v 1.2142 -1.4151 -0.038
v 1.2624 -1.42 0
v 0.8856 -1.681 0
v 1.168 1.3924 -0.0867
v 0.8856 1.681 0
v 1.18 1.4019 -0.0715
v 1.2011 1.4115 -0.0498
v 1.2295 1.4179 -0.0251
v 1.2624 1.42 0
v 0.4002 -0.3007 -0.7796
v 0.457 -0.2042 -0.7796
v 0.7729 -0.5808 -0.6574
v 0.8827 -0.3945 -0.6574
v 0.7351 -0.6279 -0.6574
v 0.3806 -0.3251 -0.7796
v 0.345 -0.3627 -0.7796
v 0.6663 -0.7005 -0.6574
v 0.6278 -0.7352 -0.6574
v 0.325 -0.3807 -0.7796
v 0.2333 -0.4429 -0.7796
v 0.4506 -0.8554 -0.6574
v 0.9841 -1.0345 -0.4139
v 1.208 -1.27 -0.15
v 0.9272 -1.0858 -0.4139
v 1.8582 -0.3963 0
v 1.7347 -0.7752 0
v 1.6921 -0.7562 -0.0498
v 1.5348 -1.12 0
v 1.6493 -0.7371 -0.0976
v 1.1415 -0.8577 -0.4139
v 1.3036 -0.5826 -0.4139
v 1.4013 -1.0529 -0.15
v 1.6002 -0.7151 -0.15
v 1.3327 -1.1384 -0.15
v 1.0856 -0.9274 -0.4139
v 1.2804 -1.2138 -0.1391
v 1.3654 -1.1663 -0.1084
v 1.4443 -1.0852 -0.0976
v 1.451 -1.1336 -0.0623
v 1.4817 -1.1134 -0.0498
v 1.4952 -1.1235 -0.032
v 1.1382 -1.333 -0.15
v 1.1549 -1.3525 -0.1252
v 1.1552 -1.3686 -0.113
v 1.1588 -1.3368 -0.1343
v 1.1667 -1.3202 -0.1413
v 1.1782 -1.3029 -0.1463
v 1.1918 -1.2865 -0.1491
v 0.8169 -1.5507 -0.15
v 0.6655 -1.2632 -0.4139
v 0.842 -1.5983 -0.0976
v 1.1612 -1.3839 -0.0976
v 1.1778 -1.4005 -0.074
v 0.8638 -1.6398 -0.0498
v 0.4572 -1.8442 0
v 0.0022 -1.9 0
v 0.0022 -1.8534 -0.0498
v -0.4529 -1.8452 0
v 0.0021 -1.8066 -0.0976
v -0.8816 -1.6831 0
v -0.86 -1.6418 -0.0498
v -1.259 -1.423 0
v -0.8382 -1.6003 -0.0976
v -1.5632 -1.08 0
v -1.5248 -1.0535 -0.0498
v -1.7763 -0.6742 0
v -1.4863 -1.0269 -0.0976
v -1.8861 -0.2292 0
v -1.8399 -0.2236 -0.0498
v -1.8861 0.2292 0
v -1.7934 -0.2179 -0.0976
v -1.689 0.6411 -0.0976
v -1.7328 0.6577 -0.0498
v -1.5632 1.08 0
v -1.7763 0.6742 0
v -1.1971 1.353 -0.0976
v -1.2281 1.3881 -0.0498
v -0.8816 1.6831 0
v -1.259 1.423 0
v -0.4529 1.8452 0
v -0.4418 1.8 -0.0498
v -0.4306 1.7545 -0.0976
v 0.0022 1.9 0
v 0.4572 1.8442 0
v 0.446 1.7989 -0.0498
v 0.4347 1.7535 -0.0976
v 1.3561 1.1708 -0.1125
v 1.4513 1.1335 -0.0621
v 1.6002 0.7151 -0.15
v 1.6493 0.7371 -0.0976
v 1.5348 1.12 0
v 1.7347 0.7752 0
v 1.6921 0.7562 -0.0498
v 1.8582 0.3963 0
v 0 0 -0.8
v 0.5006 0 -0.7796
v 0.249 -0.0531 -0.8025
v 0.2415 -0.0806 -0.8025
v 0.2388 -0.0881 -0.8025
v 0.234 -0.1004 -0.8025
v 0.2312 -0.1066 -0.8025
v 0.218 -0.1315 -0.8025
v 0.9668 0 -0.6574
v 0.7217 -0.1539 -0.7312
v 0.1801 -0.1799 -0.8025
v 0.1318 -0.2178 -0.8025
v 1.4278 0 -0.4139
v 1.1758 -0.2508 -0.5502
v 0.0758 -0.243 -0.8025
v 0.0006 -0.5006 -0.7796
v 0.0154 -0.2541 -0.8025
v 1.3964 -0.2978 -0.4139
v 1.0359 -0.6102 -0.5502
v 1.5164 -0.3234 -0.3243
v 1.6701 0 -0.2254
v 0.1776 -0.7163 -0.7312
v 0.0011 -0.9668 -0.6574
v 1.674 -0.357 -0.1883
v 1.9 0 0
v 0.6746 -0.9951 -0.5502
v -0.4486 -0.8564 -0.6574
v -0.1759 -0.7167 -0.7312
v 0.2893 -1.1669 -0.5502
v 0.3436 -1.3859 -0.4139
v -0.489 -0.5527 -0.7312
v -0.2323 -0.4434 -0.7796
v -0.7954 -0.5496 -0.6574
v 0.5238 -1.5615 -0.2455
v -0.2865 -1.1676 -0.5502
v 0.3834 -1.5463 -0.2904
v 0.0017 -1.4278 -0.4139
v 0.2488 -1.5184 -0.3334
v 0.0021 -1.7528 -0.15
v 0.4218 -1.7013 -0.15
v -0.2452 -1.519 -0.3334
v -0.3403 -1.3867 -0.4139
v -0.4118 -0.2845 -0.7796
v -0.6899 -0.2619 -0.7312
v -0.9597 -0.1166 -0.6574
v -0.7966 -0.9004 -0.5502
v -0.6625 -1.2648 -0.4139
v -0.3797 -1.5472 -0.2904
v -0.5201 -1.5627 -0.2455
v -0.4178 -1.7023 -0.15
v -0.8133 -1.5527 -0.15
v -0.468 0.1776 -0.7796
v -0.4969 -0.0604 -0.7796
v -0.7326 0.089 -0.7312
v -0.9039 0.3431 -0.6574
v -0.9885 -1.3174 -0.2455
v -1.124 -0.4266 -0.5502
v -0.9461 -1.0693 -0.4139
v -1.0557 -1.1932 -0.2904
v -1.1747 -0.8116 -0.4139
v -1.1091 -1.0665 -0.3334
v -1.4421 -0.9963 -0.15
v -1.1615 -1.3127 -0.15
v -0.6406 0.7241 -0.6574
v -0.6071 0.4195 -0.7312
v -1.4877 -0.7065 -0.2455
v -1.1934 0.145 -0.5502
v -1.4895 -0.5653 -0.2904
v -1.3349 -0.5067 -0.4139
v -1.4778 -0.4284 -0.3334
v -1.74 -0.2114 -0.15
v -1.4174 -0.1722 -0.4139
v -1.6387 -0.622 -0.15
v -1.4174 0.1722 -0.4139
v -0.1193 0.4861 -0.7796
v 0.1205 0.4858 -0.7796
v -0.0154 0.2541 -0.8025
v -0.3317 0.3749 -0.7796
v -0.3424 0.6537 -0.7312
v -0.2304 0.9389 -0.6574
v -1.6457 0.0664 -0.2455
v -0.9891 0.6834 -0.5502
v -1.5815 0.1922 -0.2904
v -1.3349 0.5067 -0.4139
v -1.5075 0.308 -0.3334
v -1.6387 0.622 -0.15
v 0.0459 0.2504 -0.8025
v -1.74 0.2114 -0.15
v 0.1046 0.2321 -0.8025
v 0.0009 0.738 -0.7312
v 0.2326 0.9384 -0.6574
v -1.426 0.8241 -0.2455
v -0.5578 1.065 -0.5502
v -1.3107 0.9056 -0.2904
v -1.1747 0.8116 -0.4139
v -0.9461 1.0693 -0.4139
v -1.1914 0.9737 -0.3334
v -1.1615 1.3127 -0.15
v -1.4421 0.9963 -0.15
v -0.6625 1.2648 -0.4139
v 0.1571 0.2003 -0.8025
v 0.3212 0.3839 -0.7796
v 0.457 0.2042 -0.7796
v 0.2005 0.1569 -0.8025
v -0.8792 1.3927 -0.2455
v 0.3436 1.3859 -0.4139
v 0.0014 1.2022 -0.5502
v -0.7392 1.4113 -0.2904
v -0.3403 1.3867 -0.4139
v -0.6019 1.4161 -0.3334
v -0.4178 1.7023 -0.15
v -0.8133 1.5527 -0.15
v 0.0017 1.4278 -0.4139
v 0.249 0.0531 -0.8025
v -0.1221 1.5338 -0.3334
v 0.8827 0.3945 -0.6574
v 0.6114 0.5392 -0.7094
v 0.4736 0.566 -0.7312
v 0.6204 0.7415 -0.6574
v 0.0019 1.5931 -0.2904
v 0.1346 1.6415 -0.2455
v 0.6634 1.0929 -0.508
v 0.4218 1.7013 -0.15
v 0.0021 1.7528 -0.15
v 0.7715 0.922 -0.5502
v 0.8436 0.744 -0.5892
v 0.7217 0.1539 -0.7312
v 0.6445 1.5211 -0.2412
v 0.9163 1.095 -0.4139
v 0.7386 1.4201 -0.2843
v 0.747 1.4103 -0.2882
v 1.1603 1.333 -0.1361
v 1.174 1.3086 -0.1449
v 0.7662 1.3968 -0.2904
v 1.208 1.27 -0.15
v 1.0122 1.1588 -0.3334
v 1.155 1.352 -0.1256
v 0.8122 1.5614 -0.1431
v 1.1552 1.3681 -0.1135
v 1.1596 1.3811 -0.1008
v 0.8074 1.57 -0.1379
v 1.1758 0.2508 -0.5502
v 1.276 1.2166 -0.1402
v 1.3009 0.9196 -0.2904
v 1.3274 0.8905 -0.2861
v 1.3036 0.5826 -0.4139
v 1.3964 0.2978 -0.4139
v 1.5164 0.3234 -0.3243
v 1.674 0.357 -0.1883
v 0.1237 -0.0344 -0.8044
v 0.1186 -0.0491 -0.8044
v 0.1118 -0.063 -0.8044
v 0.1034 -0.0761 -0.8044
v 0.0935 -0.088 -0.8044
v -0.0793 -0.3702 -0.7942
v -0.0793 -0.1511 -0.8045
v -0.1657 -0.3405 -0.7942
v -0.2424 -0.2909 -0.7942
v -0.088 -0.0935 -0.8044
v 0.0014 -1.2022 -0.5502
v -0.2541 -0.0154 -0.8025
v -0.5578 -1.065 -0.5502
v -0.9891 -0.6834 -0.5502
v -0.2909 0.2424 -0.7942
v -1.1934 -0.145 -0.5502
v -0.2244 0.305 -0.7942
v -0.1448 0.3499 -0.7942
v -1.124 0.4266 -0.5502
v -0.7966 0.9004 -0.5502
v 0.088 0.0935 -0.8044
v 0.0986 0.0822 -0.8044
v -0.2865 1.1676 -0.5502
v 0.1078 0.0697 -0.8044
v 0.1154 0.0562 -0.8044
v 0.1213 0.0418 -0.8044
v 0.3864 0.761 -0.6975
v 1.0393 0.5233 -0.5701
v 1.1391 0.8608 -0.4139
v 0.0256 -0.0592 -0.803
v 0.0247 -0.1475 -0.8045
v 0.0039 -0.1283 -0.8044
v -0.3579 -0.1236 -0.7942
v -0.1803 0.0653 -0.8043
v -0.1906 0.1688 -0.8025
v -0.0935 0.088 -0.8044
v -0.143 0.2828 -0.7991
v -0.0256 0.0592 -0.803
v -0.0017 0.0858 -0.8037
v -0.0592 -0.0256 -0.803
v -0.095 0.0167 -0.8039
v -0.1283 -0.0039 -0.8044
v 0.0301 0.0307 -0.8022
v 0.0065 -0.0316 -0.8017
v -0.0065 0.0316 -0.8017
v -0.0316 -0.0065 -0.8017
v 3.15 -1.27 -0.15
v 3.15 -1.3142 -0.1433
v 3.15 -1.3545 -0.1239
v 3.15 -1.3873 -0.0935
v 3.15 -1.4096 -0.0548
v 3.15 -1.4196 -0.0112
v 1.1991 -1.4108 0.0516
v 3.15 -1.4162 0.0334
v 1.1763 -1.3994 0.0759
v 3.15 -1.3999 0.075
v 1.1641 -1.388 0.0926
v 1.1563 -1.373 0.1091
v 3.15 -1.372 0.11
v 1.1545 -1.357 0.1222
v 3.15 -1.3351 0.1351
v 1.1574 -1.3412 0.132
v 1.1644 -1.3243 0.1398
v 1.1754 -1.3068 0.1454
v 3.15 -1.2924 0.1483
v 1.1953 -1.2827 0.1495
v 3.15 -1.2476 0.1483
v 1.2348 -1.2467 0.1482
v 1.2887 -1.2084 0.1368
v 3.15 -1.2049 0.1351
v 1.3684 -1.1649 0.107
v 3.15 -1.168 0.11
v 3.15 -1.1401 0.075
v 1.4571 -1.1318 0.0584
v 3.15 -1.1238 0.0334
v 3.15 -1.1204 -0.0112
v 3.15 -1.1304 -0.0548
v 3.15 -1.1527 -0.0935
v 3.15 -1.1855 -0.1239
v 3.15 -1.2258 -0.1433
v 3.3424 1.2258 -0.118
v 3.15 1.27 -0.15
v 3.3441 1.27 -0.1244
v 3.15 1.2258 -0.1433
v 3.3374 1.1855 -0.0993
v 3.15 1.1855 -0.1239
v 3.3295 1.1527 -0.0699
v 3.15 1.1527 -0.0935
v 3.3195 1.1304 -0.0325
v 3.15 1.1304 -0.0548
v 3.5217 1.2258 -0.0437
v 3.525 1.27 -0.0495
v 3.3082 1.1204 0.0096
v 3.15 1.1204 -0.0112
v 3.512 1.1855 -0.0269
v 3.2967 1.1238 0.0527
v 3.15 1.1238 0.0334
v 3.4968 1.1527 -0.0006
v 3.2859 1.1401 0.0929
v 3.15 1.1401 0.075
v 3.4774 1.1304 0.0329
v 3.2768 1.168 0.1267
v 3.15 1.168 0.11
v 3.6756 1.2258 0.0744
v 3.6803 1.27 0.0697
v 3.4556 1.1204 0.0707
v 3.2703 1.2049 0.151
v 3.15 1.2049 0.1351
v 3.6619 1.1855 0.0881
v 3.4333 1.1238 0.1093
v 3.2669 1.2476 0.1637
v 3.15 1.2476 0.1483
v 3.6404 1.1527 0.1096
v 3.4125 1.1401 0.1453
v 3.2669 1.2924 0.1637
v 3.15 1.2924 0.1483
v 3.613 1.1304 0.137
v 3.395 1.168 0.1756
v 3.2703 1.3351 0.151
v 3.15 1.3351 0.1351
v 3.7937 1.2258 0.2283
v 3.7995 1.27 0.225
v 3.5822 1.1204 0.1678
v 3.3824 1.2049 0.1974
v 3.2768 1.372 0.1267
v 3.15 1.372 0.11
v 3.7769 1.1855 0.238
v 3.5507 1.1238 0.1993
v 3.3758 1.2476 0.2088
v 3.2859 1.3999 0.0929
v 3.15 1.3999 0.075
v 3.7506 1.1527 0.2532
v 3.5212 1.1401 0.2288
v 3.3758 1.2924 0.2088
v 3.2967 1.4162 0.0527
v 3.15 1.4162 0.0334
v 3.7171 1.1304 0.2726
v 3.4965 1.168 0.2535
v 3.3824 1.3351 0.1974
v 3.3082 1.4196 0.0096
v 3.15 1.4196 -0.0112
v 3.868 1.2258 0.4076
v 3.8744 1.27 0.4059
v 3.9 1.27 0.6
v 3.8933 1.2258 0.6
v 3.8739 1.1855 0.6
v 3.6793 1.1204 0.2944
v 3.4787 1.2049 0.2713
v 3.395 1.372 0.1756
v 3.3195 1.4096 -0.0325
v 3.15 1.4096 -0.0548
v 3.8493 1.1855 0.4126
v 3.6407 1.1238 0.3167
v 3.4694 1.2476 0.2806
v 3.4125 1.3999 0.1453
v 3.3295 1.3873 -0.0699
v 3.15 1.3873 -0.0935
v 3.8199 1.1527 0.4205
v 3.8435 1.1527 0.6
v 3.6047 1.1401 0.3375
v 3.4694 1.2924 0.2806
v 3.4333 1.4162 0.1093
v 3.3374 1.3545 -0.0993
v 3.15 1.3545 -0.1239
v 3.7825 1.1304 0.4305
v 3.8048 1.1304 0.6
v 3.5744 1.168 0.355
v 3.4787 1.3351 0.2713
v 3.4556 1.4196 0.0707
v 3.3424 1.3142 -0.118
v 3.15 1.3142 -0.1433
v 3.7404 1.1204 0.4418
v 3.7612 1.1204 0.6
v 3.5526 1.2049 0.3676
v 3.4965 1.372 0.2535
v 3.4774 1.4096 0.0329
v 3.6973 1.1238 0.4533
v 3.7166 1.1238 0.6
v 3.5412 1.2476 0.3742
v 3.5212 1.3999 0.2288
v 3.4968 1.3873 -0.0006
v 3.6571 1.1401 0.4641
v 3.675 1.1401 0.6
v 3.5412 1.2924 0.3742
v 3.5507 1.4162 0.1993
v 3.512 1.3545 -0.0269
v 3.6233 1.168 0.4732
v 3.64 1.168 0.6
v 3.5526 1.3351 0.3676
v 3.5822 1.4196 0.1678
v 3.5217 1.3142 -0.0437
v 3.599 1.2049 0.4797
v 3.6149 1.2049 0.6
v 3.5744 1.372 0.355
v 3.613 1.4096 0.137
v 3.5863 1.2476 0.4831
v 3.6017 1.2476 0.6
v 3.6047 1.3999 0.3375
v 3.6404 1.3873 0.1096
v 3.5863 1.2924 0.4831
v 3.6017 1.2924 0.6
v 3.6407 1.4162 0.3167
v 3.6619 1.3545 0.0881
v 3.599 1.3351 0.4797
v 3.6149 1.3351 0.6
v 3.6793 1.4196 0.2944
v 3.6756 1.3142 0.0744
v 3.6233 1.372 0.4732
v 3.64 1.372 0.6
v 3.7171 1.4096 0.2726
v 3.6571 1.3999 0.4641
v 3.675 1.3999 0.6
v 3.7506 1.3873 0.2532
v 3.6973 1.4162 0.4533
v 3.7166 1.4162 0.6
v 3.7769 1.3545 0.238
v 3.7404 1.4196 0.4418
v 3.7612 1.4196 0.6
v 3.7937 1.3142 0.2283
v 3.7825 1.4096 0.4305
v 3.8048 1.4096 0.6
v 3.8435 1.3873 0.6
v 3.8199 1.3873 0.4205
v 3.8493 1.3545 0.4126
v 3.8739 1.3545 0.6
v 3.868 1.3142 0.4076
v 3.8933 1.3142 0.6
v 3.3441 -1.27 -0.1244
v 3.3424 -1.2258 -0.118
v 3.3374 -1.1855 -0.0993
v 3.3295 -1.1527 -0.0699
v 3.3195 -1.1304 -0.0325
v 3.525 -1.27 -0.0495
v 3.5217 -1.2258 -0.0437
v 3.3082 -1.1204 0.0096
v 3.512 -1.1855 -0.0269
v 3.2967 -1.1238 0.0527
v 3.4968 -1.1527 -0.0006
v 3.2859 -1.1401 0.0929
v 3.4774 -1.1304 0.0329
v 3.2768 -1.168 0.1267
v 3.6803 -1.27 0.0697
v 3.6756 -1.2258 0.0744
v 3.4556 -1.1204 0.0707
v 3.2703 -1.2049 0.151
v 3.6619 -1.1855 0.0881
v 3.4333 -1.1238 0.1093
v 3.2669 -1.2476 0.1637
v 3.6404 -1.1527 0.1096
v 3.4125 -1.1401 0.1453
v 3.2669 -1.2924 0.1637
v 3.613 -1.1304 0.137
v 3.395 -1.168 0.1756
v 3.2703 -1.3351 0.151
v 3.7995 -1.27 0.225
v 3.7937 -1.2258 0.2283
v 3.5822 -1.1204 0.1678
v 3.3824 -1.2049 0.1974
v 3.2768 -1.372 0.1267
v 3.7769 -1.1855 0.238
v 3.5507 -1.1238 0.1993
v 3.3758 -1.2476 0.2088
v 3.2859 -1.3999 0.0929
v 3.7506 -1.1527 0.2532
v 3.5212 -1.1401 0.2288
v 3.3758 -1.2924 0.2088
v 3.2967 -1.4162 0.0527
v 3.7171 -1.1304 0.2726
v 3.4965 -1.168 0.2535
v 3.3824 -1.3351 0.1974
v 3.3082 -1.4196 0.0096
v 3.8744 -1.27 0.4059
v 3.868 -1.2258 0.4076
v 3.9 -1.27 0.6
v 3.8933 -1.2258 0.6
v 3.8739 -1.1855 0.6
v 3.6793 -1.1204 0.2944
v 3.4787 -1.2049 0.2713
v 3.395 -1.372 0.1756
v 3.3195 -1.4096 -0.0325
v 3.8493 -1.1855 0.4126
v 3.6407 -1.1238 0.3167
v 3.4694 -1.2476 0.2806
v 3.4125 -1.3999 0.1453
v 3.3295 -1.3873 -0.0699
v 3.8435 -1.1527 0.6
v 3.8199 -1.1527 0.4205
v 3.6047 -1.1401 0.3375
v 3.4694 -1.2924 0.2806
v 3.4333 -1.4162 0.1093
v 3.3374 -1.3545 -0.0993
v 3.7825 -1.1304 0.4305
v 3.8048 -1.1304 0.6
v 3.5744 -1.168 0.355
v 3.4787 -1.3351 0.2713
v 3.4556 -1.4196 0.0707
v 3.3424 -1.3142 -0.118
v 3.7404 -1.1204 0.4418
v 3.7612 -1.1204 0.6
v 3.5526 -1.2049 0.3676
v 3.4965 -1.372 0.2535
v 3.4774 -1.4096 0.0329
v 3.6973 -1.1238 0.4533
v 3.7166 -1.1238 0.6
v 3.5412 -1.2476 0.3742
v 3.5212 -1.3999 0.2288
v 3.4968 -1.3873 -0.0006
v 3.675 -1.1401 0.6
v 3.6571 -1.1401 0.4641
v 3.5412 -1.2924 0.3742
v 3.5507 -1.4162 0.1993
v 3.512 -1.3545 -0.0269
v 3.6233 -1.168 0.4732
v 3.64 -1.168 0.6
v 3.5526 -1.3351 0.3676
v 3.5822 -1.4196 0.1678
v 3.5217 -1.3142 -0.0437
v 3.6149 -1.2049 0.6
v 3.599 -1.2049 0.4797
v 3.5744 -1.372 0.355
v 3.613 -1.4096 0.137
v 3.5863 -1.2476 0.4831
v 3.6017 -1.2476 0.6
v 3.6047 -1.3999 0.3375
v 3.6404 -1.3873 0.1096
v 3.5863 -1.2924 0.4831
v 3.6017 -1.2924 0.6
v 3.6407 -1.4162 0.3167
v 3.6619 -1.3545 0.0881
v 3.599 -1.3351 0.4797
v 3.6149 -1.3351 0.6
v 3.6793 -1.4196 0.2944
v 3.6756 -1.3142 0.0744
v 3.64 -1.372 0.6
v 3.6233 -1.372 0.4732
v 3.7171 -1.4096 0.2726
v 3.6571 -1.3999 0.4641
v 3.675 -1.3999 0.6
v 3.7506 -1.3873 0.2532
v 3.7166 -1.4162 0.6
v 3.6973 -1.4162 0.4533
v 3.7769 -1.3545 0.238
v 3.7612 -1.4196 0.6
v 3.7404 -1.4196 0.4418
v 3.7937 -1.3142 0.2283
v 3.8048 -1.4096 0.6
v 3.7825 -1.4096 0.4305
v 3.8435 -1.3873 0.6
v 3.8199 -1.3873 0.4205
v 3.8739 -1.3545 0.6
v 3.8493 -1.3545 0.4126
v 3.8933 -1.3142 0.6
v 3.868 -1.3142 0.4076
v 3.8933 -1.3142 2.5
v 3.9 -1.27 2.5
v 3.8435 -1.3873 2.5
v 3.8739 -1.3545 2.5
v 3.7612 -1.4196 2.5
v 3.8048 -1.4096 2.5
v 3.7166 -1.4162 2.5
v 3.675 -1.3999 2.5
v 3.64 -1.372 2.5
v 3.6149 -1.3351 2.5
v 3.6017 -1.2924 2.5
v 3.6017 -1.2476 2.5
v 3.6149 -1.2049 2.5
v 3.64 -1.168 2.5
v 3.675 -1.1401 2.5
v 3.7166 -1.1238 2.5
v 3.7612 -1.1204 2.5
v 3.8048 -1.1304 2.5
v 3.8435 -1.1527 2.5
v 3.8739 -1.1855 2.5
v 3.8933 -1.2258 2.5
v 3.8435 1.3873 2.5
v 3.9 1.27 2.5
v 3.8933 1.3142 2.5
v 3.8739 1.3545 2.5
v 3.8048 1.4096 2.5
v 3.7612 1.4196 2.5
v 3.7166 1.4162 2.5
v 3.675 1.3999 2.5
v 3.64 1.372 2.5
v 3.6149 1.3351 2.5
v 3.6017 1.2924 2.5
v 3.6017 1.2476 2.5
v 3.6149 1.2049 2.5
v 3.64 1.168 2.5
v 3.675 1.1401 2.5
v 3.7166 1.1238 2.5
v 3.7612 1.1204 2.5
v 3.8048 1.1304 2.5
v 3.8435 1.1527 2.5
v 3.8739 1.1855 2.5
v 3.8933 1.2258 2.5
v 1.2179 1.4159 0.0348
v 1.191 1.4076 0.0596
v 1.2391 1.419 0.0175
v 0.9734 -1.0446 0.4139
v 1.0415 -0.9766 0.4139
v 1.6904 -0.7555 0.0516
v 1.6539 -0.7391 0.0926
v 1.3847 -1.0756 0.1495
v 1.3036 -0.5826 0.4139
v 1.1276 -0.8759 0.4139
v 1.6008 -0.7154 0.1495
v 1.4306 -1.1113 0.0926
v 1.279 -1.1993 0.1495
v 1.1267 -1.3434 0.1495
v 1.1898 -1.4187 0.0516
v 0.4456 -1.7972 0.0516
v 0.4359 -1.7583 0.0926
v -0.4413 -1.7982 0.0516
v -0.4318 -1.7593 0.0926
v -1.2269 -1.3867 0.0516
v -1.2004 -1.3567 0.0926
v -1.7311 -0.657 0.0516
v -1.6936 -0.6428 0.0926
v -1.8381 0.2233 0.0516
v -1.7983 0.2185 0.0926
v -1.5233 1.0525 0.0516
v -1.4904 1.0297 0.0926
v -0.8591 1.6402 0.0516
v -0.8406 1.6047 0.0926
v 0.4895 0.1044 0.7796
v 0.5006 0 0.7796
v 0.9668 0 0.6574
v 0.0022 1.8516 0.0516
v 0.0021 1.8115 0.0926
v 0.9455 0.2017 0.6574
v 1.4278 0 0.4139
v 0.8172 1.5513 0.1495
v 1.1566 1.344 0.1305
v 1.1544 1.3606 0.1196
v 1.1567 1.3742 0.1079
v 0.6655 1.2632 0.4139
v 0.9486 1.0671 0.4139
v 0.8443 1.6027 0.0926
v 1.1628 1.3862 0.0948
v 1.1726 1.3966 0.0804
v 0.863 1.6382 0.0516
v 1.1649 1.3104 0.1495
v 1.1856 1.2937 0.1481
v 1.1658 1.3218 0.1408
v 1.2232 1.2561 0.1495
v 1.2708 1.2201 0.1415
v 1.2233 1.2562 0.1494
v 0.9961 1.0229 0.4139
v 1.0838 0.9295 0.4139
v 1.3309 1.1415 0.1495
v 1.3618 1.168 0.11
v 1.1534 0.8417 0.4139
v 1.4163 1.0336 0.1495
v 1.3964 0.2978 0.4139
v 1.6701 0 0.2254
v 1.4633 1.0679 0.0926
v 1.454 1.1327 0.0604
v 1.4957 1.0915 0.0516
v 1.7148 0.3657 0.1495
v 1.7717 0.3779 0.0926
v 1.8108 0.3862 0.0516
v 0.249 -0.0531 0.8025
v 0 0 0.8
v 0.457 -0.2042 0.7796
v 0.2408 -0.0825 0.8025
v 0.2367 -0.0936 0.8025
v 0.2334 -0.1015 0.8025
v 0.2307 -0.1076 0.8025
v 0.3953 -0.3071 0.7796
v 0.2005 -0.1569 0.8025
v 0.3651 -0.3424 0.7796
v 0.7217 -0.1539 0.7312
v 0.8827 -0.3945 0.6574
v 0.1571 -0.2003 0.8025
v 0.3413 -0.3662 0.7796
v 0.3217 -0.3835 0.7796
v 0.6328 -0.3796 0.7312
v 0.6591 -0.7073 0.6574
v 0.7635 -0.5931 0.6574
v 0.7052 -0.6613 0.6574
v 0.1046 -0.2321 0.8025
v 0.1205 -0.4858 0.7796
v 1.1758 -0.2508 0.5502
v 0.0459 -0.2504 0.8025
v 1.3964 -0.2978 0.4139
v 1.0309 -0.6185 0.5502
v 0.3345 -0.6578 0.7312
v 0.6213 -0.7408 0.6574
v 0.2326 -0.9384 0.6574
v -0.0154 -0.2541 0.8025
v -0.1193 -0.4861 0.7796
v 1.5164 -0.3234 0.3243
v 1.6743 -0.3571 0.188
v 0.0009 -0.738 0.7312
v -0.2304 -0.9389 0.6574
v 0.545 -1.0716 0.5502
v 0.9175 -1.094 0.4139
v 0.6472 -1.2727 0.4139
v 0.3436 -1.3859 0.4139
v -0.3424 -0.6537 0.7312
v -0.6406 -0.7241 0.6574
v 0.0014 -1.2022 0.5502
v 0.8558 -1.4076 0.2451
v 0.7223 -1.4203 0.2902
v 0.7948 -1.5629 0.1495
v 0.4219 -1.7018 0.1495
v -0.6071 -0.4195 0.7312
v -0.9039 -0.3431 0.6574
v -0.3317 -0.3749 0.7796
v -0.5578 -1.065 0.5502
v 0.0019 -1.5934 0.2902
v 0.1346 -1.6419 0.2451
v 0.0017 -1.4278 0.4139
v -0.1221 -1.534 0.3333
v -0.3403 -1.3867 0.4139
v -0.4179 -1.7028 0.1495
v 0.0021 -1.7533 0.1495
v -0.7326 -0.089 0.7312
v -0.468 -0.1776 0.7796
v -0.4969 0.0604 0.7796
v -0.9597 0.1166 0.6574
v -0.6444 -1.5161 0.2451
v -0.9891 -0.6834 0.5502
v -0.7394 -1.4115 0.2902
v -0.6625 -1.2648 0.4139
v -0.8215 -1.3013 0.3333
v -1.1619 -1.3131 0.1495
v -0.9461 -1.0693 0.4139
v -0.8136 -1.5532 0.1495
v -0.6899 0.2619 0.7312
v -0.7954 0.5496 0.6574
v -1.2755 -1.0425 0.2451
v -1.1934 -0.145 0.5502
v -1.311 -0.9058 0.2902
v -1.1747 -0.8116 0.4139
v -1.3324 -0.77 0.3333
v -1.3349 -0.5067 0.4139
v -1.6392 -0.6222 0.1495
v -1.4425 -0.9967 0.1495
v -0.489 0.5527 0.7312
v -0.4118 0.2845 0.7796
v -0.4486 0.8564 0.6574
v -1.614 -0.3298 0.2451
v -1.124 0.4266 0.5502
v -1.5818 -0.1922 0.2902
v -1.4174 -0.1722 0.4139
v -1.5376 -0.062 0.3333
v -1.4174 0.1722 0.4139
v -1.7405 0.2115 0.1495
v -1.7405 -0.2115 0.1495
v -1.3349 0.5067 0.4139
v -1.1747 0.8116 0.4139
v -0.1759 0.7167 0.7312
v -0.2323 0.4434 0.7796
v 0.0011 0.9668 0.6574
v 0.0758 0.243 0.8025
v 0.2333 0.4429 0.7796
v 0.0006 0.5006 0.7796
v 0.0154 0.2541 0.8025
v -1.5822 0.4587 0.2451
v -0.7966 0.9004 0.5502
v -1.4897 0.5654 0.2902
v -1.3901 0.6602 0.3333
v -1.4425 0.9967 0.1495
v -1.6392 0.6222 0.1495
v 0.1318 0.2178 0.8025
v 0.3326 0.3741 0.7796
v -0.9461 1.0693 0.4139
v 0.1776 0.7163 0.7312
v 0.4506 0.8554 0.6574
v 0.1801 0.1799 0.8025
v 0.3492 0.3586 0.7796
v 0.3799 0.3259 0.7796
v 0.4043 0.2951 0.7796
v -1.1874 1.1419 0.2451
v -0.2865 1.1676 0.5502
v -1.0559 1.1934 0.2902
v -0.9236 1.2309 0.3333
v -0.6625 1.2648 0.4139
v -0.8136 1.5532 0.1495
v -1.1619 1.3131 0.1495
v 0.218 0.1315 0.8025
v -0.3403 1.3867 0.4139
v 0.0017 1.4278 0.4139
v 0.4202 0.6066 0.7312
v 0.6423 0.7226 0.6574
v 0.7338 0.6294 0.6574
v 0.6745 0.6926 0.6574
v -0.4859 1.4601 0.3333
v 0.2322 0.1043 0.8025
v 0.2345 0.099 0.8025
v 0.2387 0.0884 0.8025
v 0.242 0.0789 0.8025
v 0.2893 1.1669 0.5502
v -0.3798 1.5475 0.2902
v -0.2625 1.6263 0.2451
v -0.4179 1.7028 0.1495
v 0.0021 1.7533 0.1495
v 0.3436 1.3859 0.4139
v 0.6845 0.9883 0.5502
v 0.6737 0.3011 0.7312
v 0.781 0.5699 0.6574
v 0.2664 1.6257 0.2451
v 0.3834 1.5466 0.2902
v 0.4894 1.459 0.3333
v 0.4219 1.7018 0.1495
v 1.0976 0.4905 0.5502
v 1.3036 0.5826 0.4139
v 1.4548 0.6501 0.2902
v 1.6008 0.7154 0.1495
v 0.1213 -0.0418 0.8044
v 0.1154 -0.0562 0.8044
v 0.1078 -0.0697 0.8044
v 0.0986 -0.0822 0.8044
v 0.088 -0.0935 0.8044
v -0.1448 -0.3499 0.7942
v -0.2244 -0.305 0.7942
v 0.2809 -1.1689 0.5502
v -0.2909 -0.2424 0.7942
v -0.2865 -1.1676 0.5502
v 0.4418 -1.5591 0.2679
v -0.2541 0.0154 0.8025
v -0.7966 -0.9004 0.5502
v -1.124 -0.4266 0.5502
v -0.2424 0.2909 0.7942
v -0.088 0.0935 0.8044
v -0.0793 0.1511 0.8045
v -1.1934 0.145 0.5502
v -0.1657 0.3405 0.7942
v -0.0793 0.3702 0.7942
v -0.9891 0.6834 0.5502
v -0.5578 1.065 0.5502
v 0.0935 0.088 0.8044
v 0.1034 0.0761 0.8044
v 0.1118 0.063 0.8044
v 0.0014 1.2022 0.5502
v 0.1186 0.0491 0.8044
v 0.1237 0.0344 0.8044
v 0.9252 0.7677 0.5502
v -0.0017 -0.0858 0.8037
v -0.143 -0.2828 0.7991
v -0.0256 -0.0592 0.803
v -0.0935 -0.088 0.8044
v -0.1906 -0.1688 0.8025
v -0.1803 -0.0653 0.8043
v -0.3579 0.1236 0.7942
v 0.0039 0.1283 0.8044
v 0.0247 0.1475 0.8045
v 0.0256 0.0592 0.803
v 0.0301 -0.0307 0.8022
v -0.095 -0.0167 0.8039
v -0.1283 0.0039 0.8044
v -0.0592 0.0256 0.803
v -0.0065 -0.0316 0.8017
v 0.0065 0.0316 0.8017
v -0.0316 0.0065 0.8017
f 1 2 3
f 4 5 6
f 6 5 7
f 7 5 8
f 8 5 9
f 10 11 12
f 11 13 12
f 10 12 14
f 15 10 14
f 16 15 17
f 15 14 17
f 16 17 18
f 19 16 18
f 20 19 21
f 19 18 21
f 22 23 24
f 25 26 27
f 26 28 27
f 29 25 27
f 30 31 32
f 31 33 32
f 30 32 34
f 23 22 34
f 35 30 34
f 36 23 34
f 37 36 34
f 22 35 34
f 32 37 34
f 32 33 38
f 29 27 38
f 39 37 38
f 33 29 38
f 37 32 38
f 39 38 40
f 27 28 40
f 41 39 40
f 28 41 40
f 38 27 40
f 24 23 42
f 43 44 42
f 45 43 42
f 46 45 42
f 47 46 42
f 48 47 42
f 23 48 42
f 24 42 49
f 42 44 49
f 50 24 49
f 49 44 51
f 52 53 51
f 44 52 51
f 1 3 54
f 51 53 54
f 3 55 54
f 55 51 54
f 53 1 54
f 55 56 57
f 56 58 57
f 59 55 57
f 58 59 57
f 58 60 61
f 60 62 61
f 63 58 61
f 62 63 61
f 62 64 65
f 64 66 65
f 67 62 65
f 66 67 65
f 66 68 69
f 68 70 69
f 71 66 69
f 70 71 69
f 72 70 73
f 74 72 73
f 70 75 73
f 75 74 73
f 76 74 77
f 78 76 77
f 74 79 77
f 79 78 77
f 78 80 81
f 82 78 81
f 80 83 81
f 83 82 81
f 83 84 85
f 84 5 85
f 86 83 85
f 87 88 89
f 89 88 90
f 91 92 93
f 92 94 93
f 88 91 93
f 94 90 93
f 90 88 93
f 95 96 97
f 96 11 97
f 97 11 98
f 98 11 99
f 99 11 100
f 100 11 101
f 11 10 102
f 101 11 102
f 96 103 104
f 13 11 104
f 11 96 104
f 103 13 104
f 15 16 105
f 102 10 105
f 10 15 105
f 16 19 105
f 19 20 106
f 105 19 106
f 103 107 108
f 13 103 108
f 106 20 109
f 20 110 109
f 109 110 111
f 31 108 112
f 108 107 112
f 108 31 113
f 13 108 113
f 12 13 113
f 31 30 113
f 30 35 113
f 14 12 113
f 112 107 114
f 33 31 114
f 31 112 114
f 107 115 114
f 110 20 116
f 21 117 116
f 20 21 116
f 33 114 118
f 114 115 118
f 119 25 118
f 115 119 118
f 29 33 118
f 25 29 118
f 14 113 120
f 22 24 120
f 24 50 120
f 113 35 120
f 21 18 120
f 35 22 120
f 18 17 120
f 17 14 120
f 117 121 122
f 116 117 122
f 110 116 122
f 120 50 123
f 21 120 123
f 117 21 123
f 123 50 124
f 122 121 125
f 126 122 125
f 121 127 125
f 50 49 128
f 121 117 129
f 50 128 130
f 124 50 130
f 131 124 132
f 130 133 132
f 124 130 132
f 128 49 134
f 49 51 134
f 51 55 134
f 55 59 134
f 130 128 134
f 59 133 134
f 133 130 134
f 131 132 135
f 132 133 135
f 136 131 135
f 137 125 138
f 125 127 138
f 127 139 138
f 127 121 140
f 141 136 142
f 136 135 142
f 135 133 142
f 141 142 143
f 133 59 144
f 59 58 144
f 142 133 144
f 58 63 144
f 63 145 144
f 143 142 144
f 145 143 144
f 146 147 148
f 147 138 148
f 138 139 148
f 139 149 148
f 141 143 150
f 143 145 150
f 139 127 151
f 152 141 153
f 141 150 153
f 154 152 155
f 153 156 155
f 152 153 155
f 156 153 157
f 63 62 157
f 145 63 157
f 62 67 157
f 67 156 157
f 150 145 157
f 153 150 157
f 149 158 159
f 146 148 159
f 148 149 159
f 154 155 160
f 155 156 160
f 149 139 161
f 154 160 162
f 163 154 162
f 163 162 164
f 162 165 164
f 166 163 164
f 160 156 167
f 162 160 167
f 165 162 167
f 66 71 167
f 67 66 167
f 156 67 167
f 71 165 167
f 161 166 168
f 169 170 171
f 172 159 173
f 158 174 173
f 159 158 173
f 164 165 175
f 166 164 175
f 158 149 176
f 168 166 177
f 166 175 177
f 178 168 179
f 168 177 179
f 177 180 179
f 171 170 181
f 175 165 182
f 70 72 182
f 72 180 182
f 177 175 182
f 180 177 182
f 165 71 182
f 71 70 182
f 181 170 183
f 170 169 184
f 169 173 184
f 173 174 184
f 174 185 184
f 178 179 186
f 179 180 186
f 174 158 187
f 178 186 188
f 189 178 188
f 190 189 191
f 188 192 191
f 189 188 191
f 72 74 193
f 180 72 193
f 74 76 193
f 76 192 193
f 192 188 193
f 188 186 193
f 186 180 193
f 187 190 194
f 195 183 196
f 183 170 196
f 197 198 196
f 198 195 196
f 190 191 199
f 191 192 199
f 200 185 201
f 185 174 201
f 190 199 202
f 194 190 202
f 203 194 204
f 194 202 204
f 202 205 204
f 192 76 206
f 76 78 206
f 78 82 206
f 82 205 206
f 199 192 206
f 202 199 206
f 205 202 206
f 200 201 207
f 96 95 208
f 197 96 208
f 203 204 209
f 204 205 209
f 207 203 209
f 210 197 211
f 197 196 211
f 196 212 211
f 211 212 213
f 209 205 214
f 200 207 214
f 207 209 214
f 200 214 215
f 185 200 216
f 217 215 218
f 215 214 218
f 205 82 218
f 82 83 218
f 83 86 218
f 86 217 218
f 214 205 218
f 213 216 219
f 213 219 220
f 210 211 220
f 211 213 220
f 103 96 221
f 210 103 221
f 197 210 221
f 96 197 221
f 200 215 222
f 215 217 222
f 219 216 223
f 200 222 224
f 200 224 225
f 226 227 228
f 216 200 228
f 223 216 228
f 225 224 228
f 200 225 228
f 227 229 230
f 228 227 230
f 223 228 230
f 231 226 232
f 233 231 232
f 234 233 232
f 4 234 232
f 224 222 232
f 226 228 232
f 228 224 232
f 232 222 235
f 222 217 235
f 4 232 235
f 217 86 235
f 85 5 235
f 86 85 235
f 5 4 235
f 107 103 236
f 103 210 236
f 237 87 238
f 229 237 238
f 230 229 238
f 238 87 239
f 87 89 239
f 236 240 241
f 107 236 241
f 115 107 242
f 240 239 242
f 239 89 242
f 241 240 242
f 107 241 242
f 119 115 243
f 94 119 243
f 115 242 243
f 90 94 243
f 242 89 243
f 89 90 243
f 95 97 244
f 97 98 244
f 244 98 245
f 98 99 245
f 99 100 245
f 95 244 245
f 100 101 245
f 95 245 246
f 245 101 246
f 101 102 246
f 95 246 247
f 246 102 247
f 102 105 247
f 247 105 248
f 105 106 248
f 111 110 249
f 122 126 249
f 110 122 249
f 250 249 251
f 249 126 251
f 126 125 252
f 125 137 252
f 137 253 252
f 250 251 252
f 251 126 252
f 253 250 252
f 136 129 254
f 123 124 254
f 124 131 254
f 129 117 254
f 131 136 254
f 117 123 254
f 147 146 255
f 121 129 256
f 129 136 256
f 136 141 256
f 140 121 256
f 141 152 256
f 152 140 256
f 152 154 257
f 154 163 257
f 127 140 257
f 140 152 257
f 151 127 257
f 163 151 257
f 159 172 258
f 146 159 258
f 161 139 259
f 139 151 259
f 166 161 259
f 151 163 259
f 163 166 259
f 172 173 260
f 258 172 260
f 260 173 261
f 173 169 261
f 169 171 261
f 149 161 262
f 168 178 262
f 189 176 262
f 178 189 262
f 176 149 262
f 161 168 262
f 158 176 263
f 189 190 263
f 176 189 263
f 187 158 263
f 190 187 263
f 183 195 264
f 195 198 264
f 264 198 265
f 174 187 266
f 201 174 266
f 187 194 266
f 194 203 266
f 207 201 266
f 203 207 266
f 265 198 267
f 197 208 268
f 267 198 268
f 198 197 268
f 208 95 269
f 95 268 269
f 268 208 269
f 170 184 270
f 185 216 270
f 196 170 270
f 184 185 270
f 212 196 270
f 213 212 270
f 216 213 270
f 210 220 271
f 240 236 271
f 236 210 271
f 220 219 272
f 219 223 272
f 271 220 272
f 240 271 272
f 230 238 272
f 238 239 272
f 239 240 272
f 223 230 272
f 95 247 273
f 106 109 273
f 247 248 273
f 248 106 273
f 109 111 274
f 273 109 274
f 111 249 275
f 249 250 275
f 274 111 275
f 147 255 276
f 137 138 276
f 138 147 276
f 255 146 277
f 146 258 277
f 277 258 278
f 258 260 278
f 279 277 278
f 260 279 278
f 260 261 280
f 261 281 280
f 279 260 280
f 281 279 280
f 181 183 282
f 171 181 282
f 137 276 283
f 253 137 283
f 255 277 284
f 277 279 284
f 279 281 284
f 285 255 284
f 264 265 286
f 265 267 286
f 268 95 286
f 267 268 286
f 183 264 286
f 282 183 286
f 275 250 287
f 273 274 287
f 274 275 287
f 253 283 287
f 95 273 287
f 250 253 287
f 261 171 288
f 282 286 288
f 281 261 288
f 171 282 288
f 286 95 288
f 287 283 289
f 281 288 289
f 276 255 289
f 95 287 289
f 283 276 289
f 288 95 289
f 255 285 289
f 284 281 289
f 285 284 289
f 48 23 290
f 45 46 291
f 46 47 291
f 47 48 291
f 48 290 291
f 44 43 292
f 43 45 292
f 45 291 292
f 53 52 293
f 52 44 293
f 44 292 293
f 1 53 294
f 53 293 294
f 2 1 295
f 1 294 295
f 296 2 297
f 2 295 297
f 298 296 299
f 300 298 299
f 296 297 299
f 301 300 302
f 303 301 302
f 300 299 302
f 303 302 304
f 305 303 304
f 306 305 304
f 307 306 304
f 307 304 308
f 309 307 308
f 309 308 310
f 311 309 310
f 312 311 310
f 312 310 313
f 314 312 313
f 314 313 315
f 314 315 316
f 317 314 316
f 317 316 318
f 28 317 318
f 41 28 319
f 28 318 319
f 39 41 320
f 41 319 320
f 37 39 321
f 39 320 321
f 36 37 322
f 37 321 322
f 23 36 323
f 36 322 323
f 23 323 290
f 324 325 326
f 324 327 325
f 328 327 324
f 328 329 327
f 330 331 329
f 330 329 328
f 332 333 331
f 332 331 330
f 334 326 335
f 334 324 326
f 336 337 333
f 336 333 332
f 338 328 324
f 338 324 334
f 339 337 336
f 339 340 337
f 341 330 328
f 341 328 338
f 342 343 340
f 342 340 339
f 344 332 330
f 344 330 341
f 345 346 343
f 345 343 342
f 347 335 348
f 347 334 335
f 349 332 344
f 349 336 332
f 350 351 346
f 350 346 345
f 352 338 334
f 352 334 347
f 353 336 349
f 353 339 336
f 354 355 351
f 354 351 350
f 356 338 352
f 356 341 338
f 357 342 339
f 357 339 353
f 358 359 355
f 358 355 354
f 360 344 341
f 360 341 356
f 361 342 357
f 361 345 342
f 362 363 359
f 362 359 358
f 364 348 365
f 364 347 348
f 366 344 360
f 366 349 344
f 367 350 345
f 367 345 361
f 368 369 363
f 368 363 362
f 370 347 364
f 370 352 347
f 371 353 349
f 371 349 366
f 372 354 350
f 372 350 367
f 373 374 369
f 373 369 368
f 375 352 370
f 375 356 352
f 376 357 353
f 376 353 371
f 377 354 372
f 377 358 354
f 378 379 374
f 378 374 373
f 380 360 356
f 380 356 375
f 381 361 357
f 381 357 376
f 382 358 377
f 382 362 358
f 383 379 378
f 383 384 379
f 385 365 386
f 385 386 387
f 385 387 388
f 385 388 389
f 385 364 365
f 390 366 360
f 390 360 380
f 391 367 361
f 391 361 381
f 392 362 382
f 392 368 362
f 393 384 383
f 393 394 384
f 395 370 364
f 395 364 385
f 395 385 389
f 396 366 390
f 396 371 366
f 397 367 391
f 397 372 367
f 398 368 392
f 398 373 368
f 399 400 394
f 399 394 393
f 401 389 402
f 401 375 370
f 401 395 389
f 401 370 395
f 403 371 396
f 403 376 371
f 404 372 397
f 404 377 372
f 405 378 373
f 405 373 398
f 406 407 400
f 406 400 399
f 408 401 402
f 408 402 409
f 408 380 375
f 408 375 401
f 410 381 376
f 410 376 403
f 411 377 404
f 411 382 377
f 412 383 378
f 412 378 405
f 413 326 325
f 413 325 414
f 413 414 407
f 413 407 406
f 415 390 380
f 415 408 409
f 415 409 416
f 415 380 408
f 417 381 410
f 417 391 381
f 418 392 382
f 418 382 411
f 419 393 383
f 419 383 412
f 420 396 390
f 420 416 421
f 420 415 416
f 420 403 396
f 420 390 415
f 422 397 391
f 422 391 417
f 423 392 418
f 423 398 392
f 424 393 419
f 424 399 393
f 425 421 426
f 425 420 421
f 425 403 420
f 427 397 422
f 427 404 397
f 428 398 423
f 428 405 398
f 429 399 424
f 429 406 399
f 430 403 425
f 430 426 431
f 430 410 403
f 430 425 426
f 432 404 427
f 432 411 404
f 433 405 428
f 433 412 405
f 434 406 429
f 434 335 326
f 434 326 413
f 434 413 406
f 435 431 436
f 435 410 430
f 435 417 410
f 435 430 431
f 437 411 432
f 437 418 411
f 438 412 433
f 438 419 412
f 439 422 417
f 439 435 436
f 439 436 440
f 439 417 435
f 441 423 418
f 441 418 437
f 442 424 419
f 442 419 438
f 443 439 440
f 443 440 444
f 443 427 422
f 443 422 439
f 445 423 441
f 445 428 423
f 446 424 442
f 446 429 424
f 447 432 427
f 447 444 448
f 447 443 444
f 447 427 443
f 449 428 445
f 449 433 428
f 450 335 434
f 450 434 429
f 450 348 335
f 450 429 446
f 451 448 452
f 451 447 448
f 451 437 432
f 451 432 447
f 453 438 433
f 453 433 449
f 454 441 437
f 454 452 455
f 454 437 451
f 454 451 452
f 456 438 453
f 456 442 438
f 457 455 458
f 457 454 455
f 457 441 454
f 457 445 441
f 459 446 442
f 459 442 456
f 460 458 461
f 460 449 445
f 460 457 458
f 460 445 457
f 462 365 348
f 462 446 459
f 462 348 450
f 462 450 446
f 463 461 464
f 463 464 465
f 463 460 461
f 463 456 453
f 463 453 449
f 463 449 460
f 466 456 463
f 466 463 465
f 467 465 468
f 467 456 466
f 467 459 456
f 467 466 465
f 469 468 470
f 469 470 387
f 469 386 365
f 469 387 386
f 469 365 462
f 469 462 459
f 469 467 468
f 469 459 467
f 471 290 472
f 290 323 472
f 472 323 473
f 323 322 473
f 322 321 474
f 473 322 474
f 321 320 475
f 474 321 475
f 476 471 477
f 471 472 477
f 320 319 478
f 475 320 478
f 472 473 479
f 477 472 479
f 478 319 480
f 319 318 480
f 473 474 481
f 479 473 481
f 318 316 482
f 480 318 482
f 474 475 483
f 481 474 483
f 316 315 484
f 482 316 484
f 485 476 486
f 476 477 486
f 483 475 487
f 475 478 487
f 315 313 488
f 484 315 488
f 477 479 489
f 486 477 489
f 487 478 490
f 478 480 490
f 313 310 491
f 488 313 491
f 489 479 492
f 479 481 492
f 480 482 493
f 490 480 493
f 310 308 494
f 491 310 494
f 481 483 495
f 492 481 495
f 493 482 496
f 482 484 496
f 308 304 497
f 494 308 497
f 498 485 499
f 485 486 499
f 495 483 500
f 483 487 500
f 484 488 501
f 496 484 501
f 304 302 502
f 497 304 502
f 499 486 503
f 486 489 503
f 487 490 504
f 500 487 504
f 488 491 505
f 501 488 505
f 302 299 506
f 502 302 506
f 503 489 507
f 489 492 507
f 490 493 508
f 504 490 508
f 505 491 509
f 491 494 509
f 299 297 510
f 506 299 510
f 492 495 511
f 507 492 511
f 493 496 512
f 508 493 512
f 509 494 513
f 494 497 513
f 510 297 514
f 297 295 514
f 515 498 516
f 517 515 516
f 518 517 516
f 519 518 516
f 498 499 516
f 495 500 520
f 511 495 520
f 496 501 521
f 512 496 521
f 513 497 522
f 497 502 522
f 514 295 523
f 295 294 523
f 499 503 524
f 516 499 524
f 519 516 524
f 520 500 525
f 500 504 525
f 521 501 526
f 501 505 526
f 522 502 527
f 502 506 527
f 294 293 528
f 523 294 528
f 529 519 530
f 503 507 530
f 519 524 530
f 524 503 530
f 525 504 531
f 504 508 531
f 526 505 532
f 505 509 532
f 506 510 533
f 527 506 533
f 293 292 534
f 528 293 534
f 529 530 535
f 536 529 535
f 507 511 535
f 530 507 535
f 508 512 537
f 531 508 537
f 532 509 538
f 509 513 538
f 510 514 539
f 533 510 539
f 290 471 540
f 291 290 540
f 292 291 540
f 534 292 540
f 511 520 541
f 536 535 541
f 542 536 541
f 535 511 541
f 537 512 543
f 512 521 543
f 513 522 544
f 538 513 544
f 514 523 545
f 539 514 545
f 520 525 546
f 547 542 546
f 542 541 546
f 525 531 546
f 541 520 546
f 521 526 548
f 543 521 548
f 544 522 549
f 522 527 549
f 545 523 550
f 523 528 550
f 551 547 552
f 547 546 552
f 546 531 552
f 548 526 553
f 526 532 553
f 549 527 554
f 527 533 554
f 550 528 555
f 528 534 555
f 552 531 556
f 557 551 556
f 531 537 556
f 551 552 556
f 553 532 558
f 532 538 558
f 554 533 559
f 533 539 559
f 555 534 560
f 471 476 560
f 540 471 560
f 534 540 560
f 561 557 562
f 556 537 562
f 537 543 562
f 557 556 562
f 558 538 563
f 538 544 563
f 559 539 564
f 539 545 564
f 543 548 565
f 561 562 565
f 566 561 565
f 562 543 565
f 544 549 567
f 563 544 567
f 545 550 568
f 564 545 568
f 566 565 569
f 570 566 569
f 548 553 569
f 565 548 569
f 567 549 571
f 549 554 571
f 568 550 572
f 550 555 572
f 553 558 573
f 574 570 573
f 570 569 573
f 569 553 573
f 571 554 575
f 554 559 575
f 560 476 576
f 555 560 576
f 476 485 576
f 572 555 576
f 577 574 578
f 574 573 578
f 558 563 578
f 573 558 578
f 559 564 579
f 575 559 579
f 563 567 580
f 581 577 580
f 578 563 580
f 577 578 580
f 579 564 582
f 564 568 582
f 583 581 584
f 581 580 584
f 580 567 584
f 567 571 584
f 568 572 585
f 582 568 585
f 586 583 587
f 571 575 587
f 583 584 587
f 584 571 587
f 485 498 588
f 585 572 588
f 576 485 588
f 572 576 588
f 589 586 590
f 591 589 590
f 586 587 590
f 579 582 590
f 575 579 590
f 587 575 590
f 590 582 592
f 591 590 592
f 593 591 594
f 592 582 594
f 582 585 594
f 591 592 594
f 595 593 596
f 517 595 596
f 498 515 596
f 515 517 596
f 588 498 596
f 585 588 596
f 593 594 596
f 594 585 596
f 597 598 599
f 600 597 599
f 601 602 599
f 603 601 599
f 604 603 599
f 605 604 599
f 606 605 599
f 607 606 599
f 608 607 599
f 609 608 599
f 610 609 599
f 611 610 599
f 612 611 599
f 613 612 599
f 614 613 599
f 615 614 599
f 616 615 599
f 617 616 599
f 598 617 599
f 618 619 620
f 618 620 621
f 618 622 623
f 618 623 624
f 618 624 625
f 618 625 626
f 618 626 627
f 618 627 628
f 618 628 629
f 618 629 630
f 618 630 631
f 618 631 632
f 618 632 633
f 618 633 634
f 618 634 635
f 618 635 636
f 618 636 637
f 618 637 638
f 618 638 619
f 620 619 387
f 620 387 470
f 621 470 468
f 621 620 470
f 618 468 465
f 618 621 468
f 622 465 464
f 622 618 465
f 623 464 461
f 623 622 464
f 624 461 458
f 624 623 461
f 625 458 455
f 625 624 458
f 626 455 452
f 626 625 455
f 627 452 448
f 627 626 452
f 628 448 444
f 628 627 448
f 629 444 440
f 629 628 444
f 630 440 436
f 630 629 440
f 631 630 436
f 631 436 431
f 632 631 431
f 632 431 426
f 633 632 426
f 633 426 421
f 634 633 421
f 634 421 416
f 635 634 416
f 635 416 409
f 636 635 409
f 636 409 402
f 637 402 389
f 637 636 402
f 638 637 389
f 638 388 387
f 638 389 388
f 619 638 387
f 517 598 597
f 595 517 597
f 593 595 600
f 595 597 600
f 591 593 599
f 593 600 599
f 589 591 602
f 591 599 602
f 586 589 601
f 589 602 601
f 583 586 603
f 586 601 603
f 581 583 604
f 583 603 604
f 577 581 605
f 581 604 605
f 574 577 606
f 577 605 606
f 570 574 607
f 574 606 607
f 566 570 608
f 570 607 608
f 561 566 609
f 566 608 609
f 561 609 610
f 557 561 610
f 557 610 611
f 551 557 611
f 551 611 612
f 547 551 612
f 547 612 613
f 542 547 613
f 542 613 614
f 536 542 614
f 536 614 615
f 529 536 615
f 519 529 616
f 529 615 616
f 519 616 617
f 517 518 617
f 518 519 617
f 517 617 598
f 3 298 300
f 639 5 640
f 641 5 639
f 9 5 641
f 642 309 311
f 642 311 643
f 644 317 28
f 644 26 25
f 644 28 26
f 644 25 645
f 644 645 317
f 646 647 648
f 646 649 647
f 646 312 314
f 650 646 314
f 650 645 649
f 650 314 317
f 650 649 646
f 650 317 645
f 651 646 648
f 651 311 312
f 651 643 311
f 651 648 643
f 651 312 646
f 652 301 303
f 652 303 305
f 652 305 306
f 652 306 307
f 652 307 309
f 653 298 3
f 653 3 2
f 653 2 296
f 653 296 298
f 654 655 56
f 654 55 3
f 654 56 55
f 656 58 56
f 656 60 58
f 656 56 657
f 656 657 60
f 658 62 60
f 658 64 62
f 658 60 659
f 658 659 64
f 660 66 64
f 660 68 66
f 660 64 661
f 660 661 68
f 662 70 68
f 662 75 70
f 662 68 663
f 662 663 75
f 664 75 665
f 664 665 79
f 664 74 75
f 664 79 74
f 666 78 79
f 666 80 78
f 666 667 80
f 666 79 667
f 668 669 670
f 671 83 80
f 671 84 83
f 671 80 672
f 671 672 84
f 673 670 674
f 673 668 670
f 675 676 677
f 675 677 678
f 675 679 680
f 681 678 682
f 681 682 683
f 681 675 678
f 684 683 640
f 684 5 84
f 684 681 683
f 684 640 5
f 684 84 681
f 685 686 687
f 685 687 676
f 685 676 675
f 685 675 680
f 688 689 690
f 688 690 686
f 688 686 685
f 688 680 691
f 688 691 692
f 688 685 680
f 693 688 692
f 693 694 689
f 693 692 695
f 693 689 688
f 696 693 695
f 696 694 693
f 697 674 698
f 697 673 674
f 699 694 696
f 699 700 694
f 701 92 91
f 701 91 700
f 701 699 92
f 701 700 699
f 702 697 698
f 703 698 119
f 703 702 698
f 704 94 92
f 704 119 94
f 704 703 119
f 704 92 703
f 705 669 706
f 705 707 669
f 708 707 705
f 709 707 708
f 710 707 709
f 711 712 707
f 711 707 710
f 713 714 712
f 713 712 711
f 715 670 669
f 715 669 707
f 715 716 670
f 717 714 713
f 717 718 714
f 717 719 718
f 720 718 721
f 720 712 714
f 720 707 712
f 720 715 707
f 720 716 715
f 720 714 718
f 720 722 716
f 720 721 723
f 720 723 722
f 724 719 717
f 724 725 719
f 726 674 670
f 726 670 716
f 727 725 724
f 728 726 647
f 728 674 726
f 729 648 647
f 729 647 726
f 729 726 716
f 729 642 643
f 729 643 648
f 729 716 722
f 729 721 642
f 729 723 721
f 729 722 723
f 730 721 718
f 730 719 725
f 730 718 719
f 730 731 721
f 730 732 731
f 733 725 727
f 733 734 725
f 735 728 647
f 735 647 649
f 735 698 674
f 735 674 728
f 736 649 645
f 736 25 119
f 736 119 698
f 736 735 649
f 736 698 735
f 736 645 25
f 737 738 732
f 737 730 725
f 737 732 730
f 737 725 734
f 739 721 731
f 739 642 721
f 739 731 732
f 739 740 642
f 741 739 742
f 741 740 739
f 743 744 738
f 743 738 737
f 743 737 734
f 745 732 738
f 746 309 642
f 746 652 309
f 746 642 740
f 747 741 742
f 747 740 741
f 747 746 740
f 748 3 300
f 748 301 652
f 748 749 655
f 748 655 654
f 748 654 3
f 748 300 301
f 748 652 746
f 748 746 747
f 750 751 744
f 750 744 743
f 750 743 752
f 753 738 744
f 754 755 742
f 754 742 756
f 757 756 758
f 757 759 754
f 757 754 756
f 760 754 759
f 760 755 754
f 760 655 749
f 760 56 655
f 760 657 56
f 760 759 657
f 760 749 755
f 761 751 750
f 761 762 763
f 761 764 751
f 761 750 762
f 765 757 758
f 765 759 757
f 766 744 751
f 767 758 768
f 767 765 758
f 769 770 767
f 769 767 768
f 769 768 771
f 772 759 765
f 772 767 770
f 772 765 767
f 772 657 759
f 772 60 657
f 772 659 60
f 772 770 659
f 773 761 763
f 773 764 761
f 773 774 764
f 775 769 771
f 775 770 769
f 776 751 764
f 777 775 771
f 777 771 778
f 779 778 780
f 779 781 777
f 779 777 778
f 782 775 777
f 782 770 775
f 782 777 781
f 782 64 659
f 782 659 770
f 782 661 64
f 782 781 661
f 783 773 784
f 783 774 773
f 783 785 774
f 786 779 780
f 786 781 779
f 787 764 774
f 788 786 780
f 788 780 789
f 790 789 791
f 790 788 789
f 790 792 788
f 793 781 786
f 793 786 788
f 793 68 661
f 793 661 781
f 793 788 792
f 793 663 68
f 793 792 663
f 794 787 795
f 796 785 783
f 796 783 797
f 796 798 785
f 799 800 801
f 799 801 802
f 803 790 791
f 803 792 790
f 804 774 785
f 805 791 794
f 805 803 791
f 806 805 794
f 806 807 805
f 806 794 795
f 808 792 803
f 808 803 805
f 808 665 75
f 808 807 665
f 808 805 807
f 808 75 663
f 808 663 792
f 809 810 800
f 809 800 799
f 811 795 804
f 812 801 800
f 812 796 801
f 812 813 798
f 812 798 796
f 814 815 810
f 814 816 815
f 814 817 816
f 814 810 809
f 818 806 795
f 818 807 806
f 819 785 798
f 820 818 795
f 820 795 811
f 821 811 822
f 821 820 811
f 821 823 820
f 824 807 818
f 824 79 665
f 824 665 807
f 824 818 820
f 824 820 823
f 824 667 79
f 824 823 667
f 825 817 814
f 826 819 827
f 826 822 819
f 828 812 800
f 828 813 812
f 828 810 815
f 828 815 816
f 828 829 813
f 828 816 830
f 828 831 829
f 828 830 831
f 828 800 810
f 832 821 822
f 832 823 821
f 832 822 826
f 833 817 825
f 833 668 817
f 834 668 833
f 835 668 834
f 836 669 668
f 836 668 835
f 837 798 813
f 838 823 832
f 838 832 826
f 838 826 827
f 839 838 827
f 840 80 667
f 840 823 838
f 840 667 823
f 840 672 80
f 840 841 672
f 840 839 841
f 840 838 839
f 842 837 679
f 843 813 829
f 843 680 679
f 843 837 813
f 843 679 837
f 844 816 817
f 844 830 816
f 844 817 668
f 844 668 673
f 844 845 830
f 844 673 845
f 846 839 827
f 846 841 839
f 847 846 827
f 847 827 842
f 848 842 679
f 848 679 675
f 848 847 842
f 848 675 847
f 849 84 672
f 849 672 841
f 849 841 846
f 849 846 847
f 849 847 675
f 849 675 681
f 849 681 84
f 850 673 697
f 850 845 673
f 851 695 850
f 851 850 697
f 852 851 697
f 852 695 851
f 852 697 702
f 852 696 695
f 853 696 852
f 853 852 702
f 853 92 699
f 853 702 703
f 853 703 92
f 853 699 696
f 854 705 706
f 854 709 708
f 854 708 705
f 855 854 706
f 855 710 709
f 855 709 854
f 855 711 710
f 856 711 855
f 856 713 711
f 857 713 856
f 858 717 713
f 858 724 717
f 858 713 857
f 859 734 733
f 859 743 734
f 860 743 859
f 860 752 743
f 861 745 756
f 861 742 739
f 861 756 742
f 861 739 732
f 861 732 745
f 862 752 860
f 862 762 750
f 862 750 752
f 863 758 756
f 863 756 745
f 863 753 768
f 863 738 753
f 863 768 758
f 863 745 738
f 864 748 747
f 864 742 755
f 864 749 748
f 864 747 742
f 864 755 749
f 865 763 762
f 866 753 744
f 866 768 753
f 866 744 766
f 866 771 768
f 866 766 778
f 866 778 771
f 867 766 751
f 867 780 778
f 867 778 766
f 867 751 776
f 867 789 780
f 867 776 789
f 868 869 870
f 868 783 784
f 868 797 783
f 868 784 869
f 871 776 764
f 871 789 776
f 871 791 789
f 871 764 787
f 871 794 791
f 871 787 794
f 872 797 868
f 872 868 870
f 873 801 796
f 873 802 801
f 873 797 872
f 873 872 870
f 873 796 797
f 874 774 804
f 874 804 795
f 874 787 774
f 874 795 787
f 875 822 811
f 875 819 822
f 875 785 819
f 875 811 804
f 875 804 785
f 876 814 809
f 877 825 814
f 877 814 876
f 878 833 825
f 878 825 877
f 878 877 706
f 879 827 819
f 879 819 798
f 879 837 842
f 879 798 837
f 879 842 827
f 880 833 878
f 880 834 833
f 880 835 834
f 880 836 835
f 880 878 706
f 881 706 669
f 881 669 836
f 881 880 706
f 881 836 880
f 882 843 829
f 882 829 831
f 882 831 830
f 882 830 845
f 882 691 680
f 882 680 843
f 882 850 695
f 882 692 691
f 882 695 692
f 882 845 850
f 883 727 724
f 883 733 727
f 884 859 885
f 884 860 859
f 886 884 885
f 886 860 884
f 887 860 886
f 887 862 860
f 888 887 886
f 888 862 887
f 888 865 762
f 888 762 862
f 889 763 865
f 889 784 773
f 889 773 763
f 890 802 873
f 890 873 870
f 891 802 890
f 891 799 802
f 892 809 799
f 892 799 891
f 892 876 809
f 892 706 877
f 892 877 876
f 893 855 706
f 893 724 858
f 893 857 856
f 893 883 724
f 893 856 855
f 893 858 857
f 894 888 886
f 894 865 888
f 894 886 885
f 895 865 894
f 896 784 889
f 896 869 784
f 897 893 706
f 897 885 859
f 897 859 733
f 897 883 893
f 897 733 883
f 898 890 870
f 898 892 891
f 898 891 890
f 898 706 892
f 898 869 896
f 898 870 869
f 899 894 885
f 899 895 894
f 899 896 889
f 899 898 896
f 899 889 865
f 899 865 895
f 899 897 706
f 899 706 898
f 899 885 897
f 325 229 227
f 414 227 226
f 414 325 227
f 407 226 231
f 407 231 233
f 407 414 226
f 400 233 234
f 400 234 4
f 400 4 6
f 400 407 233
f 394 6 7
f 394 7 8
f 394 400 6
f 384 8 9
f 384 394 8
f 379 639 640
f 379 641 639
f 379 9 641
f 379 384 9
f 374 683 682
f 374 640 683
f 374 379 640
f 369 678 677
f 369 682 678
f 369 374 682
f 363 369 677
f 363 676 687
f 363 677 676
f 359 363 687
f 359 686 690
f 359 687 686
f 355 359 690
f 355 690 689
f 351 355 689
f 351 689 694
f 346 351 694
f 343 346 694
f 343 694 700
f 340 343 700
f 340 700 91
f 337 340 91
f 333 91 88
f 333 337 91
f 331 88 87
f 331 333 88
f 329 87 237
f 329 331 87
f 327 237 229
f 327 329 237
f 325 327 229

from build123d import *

# Parameters (mm, degrees)
SKETCH4_R = 0.15


with BuildPart() as part:
    # Sketch3 → Revolve1 (revolve)
    with BuildSketch(Plane(origin=(0, 0, 0), x_dir=(1, 0, 0), z_dir=(0, 1, 0))):
        with BuildLine():
            Line((1.9, 0), (0, 0))
            Line((0, 0), (0, -0.8))
            add(Edge.make_bspline(
                [(0, -0.8), (1.106882422, -0.865042619), (1.9, 0)],
                knots=[0, 0, 0, 1, 1, 1], degree=2))
        make_face()
        with BuildLine():
            Line((0, 0.8), (0, 0))
            Line((0, 0), (1.9, 0))
            add(Edge.make_bspline(
                [(0, 0.8), (1.106882422, 0.865042619), (1.9, 0)],
                knots=[0, 0, 0, 1, 1, 1], degree=2))
        make_face()
    revolve(axis=Axis((0, 0, 0.8), (0, 0, -1)))

    # Sweep1: sweep along a path in Sketch5
    with BuildLine(Plane(origin=(0, 1.27, 0), x_dir=(1, 0, 0), z_dir=(0, 1, 0))) as sweep1_path:
        Line((0, 0), (3.15, 0))
        ThreePointArc((3.15, 0), (3.574264069, -0.175735931), (3.75, -0.6))
        Line((3.75, -0.6), (3.75, -2.5))
    # Sketch4 → Sweep1 (sweep)
    with BuildSketch(Plane(origin=(0, 0, 0), x_dir=(0, 0, -1), z_dir=(1, 0, 0))):
        with Locations((0, 1.27)):
            Circle(SKETCH4_R)
    sweep1 = sweep(path=sweep1_path.line)

    # Mirror1: Sweep1 across plane
    add(sweep1.mirror(Plane.ZX))


solid = part.part
